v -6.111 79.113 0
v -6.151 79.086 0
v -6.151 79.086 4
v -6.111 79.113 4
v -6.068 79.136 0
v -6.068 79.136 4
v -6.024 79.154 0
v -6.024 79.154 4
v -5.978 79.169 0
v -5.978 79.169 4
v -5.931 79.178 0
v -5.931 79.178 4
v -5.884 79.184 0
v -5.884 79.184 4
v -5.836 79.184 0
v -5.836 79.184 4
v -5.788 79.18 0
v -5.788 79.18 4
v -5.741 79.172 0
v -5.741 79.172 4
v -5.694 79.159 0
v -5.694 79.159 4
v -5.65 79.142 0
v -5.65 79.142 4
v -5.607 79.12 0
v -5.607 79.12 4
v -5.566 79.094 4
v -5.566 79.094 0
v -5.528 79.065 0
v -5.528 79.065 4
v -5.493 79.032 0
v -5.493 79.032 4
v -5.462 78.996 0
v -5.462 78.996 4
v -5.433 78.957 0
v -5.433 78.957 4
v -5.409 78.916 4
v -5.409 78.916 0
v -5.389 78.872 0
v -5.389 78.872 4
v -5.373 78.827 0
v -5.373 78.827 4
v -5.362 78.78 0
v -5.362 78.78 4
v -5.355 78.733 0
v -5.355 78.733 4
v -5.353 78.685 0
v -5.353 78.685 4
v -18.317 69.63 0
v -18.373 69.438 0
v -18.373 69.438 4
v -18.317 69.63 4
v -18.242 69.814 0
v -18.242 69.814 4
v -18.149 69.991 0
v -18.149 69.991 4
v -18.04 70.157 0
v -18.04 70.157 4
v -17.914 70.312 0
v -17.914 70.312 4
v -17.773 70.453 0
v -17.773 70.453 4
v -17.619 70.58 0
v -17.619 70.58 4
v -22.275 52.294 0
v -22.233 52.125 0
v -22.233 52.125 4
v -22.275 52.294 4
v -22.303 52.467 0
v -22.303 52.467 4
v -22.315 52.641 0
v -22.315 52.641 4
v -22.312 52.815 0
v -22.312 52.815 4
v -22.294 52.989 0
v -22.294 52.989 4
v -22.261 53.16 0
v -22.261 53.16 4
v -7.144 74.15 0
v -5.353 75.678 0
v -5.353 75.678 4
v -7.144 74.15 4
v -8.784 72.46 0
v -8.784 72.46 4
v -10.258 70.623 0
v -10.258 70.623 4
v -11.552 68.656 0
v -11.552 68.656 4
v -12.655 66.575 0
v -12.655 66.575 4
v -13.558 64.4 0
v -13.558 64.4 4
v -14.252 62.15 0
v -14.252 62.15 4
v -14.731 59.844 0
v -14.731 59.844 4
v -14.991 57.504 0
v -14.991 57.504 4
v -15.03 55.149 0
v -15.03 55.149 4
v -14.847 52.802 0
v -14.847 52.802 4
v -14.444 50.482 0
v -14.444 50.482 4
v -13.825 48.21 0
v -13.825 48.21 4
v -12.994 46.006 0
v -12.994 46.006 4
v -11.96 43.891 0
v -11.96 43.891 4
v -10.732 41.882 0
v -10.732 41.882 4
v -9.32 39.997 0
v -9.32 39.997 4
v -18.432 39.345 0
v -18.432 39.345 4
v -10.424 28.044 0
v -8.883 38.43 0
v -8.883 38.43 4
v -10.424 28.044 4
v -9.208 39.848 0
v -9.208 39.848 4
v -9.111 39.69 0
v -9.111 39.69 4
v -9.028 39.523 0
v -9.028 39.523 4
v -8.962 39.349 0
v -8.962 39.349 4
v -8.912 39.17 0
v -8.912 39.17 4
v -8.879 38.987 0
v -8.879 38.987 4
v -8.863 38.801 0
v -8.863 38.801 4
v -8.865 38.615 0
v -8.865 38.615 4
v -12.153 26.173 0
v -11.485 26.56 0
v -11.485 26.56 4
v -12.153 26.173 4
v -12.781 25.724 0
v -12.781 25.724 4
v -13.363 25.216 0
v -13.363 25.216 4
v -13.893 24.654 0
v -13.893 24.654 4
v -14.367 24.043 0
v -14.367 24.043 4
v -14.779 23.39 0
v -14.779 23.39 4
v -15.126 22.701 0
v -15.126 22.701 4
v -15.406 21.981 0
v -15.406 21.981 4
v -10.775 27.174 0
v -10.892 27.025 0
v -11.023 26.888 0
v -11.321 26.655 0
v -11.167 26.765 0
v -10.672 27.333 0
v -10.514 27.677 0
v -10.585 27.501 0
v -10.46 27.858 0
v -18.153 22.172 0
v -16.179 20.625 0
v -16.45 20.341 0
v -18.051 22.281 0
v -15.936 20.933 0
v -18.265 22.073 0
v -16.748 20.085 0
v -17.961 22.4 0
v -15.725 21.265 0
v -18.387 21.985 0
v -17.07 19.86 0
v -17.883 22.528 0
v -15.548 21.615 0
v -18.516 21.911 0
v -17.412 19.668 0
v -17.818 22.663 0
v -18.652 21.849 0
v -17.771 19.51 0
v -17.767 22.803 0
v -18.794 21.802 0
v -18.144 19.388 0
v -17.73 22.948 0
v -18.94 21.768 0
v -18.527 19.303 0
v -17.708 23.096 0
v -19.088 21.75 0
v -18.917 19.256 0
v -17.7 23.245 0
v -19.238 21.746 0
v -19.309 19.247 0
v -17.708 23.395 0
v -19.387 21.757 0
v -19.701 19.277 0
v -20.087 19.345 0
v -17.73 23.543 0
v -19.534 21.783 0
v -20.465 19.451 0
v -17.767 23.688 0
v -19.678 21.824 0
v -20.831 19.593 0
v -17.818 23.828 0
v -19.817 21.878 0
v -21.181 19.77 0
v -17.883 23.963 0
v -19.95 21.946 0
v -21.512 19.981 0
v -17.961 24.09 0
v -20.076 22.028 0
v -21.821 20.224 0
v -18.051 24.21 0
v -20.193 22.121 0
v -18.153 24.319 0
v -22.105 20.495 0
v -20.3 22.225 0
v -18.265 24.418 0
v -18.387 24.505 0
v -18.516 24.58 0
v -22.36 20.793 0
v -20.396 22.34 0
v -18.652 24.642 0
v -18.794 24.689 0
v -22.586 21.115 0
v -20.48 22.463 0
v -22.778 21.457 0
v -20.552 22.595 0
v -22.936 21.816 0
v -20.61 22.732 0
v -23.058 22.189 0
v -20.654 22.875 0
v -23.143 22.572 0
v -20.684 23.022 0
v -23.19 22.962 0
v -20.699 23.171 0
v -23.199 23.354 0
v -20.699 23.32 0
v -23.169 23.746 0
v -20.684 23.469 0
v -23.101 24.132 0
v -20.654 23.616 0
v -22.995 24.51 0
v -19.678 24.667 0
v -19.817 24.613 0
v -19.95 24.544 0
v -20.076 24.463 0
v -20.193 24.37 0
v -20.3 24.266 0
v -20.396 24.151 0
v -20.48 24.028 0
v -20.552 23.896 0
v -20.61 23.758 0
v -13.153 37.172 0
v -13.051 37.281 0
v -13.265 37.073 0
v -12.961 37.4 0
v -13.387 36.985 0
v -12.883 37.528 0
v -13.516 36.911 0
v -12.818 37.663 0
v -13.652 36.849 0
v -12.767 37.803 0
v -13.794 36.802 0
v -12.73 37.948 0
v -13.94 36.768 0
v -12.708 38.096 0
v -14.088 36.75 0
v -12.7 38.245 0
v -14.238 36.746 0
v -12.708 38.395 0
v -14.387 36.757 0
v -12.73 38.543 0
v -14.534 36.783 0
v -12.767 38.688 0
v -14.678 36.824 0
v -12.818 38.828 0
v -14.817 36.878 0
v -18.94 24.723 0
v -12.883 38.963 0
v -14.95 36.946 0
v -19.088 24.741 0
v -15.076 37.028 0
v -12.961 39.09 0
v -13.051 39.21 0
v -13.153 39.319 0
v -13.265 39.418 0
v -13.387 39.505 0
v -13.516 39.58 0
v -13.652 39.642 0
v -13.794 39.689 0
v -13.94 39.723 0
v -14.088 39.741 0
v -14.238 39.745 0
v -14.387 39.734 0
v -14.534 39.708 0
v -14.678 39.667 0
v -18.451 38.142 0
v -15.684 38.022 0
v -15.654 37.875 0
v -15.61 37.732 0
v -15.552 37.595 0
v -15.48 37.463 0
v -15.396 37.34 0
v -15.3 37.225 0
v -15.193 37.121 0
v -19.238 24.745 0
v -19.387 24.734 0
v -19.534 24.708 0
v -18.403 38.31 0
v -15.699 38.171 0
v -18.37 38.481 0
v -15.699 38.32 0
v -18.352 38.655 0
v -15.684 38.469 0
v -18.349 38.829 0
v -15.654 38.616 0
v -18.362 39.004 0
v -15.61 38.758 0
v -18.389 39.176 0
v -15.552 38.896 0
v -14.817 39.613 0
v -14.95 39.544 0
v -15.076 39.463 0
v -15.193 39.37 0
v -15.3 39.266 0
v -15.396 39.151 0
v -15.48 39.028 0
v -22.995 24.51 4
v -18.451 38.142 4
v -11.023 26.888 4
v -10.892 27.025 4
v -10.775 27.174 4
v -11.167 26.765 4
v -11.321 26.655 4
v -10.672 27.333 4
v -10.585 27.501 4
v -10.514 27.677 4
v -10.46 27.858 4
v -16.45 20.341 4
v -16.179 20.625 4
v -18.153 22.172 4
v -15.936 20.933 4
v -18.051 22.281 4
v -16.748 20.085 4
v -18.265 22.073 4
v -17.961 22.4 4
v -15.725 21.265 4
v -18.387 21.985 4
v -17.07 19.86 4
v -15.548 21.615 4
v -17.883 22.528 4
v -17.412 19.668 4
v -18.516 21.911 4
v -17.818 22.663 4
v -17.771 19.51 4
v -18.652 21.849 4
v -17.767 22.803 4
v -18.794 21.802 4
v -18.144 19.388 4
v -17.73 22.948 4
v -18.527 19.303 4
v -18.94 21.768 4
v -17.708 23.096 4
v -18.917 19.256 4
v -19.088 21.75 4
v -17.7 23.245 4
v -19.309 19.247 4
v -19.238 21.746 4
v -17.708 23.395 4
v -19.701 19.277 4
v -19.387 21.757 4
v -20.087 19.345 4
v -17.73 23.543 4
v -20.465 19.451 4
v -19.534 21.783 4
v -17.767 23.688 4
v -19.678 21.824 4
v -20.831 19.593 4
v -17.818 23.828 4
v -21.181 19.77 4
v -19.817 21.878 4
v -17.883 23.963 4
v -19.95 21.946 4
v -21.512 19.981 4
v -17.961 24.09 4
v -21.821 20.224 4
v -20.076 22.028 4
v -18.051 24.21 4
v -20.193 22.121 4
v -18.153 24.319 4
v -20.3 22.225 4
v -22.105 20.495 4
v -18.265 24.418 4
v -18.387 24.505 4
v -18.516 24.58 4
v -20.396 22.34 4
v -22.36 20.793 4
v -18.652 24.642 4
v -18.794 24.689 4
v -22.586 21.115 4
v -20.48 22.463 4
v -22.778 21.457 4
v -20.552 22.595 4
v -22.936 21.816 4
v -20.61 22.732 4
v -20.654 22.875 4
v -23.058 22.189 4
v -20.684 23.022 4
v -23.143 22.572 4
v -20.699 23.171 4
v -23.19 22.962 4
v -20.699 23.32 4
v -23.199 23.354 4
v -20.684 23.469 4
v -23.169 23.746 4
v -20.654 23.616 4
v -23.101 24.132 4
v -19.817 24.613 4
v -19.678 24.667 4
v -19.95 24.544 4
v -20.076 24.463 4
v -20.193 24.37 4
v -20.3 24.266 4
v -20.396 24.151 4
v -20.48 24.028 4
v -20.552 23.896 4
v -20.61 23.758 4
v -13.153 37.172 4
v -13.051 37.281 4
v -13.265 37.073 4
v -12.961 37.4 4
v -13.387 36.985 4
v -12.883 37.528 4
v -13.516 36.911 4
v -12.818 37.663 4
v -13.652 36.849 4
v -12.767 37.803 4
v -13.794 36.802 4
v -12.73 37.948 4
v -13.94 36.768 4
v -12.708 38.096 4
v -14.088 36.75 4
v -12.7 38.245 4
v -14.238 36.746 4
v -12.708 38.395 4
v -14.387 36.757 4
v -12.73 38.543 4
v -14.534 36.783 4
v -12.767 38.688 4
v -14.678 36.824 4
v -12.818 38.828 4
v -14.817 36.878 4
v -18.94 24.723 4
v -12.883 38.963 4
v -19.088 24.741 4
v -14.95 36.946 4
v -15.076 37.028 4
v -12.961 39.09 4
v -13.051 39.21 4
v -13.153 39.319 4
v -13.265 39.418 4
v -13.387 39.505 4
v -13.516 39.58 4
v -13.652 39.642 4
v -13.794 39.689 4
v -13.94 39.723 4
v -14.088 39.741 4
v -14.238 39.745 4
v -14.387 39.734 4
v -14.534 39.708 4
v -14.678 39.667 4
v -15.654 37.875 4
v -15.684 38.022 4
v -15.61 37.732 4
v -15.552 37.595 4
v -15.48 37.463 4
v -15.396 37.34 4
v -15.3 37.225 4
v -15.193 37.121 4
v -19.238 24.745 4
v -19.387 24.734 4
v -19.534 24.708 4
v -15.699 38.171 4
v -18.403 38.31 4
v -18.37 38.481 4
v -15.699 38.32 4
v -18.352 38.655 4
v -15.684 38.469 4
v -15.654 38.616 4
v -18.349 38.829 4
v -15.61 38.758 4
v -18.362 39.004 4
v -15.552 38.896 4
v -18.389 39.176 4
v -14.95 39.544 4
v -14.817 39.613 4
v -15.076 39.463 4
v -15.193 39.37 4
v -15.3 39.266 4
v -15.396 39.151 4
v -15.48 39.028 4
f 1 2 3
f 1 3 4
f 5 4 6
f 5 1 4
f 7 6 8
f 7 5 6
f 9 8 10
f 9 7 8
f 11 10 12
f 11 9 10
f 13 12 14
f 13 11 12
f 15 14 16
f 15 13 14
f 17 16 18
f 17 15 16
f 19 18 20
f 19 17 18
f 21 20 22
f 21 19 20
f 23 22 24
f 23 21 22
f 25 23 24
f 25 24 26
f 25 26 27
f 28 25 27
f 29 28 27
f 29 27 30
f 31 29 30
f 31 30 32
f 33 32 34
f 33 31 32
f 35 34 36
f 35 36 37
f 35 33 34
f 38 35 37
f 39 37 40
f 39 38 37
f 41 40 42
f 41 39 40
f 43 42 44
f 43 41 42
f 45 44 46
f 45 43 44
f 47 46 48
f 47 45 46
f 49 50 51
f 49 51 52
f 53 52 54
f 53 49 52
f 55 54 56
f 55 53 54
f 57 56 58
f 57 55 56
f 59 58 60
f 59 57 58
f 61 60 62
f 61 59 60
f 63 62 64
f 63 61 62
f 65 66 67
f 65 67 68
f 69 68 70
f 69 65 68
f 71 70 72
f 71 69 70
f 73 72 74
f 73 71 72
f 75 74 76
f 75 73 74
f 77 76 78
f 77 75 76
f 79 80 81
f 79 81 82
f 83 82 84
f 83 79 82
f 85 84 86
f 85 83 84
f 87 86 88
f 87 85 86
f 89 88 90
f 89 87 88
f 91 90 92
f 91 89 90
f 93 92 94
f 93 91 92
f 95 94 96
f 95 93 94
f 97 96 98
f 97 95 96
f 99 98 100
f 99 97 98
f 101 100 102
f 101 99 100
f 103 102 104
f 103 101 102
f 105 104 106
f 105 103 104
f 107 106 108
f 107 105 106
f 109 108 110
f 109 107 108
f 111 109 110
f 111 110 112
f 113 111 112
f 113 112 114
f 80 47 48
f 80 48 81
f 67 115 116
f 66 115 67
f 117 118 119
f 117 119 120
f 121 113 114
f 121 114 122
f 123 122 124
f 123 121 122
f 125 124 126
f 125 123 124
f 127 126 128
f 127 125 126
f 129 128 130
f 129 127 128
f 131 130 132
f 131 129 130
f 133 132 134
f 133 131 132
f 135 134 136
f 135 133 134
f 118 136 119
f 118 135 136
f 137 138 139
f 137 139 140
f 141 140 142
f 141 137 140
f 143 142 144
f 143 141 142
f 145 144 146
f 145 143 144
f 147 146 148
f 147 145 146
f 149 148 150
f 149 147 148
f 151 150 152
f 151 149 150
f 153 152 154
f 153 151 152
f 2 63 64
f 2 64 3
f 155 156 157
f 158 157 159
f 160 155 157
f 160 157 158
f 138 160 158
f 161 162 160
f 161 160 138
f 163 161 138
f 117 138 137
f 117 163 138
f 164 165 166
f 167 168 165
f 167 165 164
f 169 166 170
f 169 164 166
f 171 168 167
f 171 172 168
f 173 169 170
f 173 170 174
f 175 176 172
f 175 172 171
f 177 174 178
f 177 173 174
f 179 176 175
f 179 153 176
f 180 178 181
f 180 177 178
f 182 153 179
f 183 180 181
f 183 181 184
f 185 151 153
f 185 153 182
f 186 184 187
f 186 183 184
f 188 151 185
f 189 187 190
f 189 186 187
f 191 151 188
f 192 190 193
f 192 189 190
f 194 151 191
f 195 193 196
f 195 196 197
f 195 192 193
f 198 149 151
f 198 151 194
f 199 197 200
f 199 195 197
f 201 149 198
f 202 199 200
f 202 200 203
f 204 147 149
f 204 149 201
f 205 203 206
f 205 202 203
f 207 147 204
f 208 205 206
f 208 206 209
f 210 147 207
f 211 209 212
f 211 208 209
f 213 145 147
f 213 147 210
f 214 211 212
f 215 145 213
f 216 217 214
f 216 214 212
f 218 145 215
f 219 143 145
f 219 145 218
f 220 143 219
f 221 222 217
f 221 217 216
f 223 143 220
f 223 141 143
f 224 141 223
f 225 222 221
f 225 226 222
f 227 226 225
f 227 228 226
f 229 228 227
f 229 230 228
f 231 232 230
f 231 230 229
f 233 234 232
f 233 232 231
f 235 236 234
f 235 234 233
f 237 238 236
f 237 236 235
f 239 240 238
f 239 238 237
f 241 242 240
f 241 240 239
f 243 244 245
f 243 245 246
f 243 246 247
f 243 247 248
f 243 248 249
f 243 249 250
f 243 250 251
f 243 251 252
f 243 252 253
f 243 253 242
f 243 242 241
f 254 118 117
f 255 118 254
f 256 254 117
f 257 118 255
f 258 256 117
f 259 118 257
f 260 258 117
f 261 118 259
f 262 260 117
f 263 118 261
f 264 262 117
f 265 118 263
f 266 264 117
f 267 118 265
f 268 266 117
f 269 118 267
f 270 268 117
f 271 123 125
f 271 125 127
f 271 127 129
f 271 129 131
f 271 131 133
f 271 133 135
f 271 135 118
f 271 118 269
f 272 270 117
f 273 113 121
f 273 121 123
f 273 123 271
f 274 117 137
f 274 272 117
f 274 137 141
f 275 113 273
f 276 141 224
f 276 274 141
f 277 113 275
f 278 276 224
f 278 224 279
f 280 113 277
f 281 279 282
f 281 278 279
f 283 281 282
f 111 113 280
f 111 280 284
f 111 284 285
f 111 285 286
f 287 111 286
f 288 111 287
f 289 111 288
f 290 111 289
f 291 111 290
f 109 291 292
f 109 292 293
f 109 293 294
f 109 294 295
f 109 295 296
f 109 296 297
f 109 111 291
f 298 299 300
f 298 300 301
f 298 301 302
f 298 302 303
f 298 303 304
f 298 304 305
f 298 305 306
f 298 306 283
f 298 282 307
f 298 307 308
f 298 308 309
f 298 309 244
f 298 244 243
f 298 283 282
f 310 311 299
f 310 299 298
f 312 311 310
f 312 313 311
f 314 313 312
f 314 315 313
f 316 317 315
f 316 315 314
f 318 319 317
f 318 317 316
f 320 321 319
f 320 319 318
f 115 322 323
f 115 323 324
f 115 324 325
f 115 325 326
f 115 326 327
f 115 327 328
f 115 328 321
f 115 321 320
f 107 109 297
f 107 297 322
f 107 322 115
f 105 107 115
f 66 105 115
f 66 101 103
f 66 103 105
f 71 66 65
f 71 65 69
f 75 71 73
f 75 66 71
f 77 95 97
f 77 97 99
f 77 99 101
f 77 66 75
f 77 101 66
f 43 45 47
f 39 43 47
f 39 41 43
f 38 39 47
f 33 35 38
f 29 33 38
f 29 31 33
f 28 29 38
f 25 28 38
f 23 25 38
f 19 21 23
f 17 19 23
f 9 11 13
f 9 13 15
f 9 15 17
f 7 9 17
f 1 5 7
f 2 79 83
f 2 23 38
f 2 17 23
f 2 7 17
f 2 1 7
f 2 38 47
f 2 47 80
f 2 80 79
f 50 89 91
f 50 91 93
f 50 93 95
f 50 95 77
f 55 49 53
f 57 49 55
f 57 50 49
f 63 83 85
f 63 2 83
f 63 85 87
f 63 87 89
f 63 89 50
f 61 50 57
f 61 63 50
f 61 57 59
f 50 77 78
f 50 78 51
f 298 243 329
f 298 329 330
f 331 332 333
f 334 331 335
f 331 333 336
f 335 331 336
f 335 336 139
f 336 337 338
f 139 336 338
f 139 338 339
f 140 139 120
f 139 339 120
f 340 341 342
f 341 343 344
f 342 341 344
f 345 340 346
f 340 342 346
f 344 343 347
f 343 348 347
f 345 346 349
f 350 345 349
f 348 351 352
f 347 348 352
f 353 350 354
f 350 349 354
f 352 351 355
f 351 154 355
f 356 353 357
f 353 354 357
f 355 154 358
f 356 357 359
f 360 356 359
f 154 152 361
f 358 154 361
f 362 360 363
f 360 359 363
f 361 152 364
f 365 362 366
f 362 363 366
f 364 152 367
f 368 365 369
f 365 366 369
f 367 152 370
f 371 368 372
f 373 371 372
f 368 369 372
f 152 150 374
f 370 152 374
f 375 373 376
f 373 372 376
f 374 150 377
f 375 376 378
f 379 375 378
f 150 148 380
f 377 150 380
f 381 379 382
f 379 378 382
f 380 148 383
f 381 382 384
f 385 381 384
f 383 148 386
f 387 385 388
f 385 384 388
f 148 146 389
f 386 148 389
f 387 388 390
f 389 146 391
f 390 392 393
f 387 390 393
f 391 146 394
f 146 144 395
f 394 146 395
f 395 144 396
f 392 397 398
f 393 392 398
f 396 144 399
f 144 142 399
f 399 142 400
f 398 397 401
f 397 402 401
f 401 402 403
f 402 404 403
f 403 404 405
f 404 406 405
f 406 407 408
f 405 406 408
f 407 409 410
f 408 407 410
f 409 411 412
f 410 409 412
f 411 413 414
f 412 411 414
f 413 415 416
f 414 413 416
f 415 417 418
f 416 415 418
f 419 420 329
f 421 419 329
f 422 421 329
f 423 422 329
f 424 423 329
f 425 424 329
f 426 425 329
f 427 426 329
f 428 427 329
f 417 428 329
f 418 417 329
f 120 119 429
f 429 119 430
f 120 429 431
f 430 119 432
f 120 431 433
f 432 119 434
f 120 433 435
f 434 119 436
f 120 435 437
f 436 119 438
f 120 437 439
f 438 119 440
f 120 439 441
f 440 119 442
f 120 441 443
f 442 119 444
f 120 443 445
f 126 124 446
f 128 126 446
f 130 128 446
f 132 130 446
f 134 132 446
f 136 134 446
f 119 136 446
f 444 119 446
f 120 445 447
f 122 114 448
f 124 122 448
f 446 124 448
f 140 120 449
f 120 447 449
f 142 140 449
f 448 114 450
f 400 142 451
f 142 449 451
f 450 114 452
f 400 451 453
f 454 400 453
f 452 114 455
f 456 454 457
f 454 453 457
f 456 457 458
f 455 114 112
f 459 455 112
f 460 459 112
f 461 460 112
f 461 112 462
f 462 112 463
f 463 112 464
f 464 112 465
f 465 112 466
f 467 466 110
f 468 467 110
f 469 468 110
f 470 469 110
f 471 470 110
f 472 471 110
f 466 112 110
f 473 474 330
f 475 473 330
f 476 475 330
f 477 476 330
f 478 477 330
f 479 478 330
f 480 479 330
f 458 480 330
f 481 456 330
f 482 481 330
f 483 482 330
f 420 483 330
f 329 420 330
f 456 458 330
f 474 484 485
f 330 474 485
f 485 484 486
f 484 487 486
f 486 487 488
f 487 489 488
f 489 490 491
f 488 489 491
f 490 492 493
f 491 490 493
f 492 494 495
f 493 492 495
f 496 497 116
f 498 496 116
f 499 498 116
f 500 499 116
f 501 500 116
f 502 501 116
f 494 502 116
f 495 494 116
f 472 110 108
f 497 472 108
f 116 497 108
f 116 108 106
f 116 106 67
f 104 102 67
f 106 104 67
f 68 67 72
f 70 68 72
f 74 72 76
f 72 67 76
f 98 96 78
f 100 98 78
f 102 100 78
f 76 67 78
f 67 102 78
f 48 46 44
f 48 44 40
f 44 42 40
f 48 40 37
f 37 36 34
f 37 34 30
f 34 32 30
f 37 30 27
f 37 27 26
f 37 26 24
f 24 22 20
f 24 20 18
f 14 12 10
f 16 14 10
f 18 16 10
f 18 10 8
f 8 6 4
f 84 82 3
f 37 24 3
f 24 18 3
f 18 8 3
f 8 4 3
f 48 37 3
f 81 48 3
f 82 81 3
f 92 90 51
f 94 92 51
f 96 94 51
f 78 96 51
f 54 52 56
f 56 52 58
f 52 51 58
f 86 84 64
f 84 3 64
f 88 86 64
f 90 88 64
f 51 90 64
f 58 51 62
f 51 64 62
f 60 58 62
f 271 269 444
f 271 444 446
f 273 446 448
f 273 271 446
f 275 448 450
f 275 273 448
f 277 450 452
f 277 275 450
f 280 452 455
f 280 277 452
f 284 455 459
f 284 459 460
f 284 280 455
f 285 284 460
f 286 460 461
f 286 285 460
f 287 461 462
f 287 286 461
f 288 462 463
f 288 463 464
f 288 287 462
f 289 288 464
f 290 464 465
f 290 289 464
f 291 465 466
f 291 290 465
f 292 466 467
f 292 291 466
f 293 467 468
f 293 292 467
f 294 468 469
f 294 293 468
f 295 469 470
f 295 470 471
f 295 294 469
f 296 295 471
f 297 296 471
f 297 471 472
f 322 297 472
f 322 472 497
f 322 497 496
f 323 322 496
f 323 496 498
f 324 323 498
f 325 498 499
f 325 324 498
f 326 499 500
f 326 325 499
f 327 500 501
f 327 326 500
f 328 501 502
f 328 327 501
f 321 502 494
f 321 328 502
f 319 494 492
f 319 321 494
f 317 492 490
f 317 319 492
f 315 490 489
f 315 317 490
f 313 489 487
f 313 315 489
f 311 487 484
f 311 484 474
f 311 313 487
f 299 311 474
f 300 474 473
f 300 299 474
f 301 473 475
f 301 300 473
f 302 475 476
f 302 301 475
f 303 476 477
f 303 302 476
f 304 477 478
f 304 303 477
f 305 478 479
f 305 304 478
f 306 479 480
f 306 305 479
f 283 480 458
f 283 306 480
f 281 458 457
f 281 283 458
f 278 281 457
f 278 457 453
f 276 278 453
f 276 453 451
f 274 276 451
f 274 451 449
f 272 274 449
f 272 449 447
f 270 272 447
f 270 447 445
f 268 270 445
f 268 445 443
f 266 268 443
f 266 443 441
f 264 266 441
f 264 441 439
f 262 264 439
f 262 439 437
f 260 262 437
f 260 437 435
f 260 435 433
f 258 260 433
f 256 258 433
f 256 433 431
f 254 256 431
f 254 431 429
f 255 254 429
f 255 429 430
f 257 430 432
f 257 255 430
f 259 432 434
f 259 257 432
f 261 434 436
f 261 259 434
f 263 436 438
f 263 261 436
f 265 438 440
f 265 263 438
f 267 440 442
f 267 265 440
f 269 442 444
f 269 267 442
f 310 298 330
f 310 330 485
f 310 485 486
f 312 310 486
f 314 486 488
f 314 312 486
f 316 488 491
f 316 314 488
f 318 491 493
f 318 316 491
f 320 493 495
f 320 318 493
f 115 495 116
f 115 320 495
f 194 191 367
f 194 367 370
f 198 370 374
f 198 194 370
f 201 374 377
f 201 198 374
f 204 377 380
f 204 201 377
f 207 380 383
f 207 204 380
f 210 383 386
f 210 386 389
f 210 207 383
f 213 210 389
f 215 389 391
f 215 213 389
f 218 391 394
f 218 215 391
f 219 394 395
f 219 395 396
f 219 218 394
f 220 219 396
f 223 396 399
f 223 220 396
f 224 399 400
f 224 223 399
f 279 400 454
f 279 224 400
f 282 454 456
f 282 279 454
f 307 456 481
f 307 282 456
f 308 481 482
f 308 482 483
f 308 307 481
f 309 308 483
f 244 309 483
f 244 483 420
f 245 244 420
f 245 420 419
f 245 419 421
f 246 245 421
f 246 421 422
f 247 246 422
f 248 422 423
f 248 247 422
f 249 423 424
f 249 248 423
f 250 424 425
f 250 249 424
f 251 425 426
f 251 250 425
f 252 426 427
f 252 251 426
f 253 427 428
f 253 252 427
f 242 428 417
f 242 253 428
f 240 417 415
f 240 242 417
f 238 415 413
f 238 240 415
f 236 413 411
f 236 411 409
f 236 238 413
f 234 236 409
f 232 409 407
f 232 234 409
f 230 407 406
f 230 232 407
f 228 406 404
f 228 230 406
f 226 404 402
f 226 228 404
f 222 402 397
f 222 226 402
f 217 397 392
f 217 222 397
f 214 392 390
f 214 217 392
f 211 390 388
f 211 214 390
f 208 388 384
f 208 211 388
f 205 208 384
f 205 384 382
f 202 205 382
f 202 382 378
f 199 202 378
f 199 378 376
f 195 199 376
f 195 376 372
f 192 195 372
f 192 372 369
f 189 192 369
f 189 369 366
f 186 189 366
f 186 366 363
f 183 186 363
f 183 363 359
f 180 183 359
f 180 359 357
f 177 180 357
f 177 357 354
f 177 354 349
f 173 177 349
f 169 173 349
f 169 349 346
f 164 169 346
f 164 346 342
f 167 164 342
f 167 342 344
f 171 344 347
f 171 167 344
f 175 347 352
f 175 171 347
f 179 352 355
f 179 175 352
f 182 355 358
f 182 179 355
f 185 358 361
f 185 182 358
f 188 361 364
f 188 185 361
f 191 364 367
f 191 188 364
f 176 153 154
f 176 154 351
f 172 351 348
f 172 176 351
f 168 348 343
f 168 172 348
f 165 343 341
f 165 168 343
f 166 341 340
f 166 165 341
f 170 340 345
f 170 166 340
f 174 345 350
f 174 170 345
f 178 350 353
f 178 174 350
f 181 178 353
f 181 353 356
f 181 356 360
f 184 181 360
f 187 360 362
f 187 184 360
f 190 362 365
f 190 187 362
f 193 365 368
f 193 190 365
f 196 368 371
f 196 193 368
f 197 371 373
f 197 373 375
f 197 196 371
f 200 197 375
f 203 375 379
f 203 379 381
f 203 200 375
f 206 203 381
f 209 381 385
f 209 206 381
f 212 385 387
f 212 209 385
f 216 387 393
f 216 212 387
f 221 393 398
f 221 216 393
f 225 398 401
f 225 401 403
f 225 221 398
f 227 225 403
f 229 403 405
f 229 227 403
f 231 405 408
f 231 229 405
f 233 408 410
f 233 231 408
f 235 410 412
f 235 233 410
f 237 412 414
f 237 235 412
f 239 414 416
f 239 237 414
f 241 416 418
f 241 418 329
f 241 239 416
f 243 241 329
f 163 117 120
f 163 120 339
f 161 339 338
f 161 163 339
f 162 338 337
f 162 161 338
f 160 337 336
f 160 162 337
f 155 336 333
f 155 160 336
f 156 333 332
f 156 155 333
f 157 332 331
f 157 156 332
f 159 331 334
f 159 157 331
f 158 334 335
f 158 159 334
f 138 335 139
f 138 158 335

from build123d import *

# Parameters (mm, degrees)
SKETCH_1_R      = 1.5
EXTRUDE_1_DEPTH = 4


with BuildPart() as part:
    # 草图1 → 凸台-拉伸1 (new body)
    with BuildSketch(Plane.XY):
        with BuildLine():
            Line((-8.883361298, 38.430372232), (-10.42356995, 28.043950456))
            ThreePointArc((-10.42356995, 28.043950456), (-10.775128008, 27.17392517), (-11.484802252, 26.560003729))
            ThreePointArc((-11.484802252, 26.560003729), (-13.893149851, 24.653752275), (-15.405733358, 21.980547476))
            ThreePointArc((-15.405733358, 21.980547476), (-20.465380085, 19.450724806), (-22.995202754, 24.510371532))
            Line((-22.995202754, 24.510371532), (-18.451197233, 38.142383115))
            ThreePointArc((-18.451197233, 38.142383115), (-18.348830032, 38.742204214), (-18.431570381, 39.345046174))
            Line((-18.431570381, 39.345046174), (-22.233001172, 52.125165651))
            ThreePointArc((-22.233001172, 52.125165651), (-22.31526172, 52.64074939), (-22.261276417, 53.160055635))
            Line((-22.261276417, 53.160055635), (-18.372774426, 69.438220218))
            ThreePointArc((-18.372774426, 69.438220218), (-18.096529541, 70.075517478), (-17.618975762, 70.579899696))
            Line((-17.618975762, 70.579899696), (-6.150614111, 79.086205979))
            ThreePointArc((-6.150614111, 79.086205979), (-5.627950875, 79.131232586), (-5.352746621, 78.684615443))
            Line((-5.352746621, 78.684615443), (-5.352746621, 75.677999772))
            ThreePointArc((-5.352746621, 75.677999772), (-14.888864346, 58.677248629), (-9.31952103, 39.997165768))
            ThreePointArc((-9.31952103, 39.997165768), (-8.934989705, 39.260105305), (-8.883361298, 38.430372232))
        make_face()
        with Locations((-19.200468056, 23.245459504)):
            Circle(SKETCH_1_R, mode=Mode.SUBTRACT)
        with Locations((-14.200468056, 38.245459504)):
            Circle(SKETCH_1_R, mode=Mode.SUBTRACT)
    extrude(amount=EXTRUDE_1_DEPTH)


solid = part.part
